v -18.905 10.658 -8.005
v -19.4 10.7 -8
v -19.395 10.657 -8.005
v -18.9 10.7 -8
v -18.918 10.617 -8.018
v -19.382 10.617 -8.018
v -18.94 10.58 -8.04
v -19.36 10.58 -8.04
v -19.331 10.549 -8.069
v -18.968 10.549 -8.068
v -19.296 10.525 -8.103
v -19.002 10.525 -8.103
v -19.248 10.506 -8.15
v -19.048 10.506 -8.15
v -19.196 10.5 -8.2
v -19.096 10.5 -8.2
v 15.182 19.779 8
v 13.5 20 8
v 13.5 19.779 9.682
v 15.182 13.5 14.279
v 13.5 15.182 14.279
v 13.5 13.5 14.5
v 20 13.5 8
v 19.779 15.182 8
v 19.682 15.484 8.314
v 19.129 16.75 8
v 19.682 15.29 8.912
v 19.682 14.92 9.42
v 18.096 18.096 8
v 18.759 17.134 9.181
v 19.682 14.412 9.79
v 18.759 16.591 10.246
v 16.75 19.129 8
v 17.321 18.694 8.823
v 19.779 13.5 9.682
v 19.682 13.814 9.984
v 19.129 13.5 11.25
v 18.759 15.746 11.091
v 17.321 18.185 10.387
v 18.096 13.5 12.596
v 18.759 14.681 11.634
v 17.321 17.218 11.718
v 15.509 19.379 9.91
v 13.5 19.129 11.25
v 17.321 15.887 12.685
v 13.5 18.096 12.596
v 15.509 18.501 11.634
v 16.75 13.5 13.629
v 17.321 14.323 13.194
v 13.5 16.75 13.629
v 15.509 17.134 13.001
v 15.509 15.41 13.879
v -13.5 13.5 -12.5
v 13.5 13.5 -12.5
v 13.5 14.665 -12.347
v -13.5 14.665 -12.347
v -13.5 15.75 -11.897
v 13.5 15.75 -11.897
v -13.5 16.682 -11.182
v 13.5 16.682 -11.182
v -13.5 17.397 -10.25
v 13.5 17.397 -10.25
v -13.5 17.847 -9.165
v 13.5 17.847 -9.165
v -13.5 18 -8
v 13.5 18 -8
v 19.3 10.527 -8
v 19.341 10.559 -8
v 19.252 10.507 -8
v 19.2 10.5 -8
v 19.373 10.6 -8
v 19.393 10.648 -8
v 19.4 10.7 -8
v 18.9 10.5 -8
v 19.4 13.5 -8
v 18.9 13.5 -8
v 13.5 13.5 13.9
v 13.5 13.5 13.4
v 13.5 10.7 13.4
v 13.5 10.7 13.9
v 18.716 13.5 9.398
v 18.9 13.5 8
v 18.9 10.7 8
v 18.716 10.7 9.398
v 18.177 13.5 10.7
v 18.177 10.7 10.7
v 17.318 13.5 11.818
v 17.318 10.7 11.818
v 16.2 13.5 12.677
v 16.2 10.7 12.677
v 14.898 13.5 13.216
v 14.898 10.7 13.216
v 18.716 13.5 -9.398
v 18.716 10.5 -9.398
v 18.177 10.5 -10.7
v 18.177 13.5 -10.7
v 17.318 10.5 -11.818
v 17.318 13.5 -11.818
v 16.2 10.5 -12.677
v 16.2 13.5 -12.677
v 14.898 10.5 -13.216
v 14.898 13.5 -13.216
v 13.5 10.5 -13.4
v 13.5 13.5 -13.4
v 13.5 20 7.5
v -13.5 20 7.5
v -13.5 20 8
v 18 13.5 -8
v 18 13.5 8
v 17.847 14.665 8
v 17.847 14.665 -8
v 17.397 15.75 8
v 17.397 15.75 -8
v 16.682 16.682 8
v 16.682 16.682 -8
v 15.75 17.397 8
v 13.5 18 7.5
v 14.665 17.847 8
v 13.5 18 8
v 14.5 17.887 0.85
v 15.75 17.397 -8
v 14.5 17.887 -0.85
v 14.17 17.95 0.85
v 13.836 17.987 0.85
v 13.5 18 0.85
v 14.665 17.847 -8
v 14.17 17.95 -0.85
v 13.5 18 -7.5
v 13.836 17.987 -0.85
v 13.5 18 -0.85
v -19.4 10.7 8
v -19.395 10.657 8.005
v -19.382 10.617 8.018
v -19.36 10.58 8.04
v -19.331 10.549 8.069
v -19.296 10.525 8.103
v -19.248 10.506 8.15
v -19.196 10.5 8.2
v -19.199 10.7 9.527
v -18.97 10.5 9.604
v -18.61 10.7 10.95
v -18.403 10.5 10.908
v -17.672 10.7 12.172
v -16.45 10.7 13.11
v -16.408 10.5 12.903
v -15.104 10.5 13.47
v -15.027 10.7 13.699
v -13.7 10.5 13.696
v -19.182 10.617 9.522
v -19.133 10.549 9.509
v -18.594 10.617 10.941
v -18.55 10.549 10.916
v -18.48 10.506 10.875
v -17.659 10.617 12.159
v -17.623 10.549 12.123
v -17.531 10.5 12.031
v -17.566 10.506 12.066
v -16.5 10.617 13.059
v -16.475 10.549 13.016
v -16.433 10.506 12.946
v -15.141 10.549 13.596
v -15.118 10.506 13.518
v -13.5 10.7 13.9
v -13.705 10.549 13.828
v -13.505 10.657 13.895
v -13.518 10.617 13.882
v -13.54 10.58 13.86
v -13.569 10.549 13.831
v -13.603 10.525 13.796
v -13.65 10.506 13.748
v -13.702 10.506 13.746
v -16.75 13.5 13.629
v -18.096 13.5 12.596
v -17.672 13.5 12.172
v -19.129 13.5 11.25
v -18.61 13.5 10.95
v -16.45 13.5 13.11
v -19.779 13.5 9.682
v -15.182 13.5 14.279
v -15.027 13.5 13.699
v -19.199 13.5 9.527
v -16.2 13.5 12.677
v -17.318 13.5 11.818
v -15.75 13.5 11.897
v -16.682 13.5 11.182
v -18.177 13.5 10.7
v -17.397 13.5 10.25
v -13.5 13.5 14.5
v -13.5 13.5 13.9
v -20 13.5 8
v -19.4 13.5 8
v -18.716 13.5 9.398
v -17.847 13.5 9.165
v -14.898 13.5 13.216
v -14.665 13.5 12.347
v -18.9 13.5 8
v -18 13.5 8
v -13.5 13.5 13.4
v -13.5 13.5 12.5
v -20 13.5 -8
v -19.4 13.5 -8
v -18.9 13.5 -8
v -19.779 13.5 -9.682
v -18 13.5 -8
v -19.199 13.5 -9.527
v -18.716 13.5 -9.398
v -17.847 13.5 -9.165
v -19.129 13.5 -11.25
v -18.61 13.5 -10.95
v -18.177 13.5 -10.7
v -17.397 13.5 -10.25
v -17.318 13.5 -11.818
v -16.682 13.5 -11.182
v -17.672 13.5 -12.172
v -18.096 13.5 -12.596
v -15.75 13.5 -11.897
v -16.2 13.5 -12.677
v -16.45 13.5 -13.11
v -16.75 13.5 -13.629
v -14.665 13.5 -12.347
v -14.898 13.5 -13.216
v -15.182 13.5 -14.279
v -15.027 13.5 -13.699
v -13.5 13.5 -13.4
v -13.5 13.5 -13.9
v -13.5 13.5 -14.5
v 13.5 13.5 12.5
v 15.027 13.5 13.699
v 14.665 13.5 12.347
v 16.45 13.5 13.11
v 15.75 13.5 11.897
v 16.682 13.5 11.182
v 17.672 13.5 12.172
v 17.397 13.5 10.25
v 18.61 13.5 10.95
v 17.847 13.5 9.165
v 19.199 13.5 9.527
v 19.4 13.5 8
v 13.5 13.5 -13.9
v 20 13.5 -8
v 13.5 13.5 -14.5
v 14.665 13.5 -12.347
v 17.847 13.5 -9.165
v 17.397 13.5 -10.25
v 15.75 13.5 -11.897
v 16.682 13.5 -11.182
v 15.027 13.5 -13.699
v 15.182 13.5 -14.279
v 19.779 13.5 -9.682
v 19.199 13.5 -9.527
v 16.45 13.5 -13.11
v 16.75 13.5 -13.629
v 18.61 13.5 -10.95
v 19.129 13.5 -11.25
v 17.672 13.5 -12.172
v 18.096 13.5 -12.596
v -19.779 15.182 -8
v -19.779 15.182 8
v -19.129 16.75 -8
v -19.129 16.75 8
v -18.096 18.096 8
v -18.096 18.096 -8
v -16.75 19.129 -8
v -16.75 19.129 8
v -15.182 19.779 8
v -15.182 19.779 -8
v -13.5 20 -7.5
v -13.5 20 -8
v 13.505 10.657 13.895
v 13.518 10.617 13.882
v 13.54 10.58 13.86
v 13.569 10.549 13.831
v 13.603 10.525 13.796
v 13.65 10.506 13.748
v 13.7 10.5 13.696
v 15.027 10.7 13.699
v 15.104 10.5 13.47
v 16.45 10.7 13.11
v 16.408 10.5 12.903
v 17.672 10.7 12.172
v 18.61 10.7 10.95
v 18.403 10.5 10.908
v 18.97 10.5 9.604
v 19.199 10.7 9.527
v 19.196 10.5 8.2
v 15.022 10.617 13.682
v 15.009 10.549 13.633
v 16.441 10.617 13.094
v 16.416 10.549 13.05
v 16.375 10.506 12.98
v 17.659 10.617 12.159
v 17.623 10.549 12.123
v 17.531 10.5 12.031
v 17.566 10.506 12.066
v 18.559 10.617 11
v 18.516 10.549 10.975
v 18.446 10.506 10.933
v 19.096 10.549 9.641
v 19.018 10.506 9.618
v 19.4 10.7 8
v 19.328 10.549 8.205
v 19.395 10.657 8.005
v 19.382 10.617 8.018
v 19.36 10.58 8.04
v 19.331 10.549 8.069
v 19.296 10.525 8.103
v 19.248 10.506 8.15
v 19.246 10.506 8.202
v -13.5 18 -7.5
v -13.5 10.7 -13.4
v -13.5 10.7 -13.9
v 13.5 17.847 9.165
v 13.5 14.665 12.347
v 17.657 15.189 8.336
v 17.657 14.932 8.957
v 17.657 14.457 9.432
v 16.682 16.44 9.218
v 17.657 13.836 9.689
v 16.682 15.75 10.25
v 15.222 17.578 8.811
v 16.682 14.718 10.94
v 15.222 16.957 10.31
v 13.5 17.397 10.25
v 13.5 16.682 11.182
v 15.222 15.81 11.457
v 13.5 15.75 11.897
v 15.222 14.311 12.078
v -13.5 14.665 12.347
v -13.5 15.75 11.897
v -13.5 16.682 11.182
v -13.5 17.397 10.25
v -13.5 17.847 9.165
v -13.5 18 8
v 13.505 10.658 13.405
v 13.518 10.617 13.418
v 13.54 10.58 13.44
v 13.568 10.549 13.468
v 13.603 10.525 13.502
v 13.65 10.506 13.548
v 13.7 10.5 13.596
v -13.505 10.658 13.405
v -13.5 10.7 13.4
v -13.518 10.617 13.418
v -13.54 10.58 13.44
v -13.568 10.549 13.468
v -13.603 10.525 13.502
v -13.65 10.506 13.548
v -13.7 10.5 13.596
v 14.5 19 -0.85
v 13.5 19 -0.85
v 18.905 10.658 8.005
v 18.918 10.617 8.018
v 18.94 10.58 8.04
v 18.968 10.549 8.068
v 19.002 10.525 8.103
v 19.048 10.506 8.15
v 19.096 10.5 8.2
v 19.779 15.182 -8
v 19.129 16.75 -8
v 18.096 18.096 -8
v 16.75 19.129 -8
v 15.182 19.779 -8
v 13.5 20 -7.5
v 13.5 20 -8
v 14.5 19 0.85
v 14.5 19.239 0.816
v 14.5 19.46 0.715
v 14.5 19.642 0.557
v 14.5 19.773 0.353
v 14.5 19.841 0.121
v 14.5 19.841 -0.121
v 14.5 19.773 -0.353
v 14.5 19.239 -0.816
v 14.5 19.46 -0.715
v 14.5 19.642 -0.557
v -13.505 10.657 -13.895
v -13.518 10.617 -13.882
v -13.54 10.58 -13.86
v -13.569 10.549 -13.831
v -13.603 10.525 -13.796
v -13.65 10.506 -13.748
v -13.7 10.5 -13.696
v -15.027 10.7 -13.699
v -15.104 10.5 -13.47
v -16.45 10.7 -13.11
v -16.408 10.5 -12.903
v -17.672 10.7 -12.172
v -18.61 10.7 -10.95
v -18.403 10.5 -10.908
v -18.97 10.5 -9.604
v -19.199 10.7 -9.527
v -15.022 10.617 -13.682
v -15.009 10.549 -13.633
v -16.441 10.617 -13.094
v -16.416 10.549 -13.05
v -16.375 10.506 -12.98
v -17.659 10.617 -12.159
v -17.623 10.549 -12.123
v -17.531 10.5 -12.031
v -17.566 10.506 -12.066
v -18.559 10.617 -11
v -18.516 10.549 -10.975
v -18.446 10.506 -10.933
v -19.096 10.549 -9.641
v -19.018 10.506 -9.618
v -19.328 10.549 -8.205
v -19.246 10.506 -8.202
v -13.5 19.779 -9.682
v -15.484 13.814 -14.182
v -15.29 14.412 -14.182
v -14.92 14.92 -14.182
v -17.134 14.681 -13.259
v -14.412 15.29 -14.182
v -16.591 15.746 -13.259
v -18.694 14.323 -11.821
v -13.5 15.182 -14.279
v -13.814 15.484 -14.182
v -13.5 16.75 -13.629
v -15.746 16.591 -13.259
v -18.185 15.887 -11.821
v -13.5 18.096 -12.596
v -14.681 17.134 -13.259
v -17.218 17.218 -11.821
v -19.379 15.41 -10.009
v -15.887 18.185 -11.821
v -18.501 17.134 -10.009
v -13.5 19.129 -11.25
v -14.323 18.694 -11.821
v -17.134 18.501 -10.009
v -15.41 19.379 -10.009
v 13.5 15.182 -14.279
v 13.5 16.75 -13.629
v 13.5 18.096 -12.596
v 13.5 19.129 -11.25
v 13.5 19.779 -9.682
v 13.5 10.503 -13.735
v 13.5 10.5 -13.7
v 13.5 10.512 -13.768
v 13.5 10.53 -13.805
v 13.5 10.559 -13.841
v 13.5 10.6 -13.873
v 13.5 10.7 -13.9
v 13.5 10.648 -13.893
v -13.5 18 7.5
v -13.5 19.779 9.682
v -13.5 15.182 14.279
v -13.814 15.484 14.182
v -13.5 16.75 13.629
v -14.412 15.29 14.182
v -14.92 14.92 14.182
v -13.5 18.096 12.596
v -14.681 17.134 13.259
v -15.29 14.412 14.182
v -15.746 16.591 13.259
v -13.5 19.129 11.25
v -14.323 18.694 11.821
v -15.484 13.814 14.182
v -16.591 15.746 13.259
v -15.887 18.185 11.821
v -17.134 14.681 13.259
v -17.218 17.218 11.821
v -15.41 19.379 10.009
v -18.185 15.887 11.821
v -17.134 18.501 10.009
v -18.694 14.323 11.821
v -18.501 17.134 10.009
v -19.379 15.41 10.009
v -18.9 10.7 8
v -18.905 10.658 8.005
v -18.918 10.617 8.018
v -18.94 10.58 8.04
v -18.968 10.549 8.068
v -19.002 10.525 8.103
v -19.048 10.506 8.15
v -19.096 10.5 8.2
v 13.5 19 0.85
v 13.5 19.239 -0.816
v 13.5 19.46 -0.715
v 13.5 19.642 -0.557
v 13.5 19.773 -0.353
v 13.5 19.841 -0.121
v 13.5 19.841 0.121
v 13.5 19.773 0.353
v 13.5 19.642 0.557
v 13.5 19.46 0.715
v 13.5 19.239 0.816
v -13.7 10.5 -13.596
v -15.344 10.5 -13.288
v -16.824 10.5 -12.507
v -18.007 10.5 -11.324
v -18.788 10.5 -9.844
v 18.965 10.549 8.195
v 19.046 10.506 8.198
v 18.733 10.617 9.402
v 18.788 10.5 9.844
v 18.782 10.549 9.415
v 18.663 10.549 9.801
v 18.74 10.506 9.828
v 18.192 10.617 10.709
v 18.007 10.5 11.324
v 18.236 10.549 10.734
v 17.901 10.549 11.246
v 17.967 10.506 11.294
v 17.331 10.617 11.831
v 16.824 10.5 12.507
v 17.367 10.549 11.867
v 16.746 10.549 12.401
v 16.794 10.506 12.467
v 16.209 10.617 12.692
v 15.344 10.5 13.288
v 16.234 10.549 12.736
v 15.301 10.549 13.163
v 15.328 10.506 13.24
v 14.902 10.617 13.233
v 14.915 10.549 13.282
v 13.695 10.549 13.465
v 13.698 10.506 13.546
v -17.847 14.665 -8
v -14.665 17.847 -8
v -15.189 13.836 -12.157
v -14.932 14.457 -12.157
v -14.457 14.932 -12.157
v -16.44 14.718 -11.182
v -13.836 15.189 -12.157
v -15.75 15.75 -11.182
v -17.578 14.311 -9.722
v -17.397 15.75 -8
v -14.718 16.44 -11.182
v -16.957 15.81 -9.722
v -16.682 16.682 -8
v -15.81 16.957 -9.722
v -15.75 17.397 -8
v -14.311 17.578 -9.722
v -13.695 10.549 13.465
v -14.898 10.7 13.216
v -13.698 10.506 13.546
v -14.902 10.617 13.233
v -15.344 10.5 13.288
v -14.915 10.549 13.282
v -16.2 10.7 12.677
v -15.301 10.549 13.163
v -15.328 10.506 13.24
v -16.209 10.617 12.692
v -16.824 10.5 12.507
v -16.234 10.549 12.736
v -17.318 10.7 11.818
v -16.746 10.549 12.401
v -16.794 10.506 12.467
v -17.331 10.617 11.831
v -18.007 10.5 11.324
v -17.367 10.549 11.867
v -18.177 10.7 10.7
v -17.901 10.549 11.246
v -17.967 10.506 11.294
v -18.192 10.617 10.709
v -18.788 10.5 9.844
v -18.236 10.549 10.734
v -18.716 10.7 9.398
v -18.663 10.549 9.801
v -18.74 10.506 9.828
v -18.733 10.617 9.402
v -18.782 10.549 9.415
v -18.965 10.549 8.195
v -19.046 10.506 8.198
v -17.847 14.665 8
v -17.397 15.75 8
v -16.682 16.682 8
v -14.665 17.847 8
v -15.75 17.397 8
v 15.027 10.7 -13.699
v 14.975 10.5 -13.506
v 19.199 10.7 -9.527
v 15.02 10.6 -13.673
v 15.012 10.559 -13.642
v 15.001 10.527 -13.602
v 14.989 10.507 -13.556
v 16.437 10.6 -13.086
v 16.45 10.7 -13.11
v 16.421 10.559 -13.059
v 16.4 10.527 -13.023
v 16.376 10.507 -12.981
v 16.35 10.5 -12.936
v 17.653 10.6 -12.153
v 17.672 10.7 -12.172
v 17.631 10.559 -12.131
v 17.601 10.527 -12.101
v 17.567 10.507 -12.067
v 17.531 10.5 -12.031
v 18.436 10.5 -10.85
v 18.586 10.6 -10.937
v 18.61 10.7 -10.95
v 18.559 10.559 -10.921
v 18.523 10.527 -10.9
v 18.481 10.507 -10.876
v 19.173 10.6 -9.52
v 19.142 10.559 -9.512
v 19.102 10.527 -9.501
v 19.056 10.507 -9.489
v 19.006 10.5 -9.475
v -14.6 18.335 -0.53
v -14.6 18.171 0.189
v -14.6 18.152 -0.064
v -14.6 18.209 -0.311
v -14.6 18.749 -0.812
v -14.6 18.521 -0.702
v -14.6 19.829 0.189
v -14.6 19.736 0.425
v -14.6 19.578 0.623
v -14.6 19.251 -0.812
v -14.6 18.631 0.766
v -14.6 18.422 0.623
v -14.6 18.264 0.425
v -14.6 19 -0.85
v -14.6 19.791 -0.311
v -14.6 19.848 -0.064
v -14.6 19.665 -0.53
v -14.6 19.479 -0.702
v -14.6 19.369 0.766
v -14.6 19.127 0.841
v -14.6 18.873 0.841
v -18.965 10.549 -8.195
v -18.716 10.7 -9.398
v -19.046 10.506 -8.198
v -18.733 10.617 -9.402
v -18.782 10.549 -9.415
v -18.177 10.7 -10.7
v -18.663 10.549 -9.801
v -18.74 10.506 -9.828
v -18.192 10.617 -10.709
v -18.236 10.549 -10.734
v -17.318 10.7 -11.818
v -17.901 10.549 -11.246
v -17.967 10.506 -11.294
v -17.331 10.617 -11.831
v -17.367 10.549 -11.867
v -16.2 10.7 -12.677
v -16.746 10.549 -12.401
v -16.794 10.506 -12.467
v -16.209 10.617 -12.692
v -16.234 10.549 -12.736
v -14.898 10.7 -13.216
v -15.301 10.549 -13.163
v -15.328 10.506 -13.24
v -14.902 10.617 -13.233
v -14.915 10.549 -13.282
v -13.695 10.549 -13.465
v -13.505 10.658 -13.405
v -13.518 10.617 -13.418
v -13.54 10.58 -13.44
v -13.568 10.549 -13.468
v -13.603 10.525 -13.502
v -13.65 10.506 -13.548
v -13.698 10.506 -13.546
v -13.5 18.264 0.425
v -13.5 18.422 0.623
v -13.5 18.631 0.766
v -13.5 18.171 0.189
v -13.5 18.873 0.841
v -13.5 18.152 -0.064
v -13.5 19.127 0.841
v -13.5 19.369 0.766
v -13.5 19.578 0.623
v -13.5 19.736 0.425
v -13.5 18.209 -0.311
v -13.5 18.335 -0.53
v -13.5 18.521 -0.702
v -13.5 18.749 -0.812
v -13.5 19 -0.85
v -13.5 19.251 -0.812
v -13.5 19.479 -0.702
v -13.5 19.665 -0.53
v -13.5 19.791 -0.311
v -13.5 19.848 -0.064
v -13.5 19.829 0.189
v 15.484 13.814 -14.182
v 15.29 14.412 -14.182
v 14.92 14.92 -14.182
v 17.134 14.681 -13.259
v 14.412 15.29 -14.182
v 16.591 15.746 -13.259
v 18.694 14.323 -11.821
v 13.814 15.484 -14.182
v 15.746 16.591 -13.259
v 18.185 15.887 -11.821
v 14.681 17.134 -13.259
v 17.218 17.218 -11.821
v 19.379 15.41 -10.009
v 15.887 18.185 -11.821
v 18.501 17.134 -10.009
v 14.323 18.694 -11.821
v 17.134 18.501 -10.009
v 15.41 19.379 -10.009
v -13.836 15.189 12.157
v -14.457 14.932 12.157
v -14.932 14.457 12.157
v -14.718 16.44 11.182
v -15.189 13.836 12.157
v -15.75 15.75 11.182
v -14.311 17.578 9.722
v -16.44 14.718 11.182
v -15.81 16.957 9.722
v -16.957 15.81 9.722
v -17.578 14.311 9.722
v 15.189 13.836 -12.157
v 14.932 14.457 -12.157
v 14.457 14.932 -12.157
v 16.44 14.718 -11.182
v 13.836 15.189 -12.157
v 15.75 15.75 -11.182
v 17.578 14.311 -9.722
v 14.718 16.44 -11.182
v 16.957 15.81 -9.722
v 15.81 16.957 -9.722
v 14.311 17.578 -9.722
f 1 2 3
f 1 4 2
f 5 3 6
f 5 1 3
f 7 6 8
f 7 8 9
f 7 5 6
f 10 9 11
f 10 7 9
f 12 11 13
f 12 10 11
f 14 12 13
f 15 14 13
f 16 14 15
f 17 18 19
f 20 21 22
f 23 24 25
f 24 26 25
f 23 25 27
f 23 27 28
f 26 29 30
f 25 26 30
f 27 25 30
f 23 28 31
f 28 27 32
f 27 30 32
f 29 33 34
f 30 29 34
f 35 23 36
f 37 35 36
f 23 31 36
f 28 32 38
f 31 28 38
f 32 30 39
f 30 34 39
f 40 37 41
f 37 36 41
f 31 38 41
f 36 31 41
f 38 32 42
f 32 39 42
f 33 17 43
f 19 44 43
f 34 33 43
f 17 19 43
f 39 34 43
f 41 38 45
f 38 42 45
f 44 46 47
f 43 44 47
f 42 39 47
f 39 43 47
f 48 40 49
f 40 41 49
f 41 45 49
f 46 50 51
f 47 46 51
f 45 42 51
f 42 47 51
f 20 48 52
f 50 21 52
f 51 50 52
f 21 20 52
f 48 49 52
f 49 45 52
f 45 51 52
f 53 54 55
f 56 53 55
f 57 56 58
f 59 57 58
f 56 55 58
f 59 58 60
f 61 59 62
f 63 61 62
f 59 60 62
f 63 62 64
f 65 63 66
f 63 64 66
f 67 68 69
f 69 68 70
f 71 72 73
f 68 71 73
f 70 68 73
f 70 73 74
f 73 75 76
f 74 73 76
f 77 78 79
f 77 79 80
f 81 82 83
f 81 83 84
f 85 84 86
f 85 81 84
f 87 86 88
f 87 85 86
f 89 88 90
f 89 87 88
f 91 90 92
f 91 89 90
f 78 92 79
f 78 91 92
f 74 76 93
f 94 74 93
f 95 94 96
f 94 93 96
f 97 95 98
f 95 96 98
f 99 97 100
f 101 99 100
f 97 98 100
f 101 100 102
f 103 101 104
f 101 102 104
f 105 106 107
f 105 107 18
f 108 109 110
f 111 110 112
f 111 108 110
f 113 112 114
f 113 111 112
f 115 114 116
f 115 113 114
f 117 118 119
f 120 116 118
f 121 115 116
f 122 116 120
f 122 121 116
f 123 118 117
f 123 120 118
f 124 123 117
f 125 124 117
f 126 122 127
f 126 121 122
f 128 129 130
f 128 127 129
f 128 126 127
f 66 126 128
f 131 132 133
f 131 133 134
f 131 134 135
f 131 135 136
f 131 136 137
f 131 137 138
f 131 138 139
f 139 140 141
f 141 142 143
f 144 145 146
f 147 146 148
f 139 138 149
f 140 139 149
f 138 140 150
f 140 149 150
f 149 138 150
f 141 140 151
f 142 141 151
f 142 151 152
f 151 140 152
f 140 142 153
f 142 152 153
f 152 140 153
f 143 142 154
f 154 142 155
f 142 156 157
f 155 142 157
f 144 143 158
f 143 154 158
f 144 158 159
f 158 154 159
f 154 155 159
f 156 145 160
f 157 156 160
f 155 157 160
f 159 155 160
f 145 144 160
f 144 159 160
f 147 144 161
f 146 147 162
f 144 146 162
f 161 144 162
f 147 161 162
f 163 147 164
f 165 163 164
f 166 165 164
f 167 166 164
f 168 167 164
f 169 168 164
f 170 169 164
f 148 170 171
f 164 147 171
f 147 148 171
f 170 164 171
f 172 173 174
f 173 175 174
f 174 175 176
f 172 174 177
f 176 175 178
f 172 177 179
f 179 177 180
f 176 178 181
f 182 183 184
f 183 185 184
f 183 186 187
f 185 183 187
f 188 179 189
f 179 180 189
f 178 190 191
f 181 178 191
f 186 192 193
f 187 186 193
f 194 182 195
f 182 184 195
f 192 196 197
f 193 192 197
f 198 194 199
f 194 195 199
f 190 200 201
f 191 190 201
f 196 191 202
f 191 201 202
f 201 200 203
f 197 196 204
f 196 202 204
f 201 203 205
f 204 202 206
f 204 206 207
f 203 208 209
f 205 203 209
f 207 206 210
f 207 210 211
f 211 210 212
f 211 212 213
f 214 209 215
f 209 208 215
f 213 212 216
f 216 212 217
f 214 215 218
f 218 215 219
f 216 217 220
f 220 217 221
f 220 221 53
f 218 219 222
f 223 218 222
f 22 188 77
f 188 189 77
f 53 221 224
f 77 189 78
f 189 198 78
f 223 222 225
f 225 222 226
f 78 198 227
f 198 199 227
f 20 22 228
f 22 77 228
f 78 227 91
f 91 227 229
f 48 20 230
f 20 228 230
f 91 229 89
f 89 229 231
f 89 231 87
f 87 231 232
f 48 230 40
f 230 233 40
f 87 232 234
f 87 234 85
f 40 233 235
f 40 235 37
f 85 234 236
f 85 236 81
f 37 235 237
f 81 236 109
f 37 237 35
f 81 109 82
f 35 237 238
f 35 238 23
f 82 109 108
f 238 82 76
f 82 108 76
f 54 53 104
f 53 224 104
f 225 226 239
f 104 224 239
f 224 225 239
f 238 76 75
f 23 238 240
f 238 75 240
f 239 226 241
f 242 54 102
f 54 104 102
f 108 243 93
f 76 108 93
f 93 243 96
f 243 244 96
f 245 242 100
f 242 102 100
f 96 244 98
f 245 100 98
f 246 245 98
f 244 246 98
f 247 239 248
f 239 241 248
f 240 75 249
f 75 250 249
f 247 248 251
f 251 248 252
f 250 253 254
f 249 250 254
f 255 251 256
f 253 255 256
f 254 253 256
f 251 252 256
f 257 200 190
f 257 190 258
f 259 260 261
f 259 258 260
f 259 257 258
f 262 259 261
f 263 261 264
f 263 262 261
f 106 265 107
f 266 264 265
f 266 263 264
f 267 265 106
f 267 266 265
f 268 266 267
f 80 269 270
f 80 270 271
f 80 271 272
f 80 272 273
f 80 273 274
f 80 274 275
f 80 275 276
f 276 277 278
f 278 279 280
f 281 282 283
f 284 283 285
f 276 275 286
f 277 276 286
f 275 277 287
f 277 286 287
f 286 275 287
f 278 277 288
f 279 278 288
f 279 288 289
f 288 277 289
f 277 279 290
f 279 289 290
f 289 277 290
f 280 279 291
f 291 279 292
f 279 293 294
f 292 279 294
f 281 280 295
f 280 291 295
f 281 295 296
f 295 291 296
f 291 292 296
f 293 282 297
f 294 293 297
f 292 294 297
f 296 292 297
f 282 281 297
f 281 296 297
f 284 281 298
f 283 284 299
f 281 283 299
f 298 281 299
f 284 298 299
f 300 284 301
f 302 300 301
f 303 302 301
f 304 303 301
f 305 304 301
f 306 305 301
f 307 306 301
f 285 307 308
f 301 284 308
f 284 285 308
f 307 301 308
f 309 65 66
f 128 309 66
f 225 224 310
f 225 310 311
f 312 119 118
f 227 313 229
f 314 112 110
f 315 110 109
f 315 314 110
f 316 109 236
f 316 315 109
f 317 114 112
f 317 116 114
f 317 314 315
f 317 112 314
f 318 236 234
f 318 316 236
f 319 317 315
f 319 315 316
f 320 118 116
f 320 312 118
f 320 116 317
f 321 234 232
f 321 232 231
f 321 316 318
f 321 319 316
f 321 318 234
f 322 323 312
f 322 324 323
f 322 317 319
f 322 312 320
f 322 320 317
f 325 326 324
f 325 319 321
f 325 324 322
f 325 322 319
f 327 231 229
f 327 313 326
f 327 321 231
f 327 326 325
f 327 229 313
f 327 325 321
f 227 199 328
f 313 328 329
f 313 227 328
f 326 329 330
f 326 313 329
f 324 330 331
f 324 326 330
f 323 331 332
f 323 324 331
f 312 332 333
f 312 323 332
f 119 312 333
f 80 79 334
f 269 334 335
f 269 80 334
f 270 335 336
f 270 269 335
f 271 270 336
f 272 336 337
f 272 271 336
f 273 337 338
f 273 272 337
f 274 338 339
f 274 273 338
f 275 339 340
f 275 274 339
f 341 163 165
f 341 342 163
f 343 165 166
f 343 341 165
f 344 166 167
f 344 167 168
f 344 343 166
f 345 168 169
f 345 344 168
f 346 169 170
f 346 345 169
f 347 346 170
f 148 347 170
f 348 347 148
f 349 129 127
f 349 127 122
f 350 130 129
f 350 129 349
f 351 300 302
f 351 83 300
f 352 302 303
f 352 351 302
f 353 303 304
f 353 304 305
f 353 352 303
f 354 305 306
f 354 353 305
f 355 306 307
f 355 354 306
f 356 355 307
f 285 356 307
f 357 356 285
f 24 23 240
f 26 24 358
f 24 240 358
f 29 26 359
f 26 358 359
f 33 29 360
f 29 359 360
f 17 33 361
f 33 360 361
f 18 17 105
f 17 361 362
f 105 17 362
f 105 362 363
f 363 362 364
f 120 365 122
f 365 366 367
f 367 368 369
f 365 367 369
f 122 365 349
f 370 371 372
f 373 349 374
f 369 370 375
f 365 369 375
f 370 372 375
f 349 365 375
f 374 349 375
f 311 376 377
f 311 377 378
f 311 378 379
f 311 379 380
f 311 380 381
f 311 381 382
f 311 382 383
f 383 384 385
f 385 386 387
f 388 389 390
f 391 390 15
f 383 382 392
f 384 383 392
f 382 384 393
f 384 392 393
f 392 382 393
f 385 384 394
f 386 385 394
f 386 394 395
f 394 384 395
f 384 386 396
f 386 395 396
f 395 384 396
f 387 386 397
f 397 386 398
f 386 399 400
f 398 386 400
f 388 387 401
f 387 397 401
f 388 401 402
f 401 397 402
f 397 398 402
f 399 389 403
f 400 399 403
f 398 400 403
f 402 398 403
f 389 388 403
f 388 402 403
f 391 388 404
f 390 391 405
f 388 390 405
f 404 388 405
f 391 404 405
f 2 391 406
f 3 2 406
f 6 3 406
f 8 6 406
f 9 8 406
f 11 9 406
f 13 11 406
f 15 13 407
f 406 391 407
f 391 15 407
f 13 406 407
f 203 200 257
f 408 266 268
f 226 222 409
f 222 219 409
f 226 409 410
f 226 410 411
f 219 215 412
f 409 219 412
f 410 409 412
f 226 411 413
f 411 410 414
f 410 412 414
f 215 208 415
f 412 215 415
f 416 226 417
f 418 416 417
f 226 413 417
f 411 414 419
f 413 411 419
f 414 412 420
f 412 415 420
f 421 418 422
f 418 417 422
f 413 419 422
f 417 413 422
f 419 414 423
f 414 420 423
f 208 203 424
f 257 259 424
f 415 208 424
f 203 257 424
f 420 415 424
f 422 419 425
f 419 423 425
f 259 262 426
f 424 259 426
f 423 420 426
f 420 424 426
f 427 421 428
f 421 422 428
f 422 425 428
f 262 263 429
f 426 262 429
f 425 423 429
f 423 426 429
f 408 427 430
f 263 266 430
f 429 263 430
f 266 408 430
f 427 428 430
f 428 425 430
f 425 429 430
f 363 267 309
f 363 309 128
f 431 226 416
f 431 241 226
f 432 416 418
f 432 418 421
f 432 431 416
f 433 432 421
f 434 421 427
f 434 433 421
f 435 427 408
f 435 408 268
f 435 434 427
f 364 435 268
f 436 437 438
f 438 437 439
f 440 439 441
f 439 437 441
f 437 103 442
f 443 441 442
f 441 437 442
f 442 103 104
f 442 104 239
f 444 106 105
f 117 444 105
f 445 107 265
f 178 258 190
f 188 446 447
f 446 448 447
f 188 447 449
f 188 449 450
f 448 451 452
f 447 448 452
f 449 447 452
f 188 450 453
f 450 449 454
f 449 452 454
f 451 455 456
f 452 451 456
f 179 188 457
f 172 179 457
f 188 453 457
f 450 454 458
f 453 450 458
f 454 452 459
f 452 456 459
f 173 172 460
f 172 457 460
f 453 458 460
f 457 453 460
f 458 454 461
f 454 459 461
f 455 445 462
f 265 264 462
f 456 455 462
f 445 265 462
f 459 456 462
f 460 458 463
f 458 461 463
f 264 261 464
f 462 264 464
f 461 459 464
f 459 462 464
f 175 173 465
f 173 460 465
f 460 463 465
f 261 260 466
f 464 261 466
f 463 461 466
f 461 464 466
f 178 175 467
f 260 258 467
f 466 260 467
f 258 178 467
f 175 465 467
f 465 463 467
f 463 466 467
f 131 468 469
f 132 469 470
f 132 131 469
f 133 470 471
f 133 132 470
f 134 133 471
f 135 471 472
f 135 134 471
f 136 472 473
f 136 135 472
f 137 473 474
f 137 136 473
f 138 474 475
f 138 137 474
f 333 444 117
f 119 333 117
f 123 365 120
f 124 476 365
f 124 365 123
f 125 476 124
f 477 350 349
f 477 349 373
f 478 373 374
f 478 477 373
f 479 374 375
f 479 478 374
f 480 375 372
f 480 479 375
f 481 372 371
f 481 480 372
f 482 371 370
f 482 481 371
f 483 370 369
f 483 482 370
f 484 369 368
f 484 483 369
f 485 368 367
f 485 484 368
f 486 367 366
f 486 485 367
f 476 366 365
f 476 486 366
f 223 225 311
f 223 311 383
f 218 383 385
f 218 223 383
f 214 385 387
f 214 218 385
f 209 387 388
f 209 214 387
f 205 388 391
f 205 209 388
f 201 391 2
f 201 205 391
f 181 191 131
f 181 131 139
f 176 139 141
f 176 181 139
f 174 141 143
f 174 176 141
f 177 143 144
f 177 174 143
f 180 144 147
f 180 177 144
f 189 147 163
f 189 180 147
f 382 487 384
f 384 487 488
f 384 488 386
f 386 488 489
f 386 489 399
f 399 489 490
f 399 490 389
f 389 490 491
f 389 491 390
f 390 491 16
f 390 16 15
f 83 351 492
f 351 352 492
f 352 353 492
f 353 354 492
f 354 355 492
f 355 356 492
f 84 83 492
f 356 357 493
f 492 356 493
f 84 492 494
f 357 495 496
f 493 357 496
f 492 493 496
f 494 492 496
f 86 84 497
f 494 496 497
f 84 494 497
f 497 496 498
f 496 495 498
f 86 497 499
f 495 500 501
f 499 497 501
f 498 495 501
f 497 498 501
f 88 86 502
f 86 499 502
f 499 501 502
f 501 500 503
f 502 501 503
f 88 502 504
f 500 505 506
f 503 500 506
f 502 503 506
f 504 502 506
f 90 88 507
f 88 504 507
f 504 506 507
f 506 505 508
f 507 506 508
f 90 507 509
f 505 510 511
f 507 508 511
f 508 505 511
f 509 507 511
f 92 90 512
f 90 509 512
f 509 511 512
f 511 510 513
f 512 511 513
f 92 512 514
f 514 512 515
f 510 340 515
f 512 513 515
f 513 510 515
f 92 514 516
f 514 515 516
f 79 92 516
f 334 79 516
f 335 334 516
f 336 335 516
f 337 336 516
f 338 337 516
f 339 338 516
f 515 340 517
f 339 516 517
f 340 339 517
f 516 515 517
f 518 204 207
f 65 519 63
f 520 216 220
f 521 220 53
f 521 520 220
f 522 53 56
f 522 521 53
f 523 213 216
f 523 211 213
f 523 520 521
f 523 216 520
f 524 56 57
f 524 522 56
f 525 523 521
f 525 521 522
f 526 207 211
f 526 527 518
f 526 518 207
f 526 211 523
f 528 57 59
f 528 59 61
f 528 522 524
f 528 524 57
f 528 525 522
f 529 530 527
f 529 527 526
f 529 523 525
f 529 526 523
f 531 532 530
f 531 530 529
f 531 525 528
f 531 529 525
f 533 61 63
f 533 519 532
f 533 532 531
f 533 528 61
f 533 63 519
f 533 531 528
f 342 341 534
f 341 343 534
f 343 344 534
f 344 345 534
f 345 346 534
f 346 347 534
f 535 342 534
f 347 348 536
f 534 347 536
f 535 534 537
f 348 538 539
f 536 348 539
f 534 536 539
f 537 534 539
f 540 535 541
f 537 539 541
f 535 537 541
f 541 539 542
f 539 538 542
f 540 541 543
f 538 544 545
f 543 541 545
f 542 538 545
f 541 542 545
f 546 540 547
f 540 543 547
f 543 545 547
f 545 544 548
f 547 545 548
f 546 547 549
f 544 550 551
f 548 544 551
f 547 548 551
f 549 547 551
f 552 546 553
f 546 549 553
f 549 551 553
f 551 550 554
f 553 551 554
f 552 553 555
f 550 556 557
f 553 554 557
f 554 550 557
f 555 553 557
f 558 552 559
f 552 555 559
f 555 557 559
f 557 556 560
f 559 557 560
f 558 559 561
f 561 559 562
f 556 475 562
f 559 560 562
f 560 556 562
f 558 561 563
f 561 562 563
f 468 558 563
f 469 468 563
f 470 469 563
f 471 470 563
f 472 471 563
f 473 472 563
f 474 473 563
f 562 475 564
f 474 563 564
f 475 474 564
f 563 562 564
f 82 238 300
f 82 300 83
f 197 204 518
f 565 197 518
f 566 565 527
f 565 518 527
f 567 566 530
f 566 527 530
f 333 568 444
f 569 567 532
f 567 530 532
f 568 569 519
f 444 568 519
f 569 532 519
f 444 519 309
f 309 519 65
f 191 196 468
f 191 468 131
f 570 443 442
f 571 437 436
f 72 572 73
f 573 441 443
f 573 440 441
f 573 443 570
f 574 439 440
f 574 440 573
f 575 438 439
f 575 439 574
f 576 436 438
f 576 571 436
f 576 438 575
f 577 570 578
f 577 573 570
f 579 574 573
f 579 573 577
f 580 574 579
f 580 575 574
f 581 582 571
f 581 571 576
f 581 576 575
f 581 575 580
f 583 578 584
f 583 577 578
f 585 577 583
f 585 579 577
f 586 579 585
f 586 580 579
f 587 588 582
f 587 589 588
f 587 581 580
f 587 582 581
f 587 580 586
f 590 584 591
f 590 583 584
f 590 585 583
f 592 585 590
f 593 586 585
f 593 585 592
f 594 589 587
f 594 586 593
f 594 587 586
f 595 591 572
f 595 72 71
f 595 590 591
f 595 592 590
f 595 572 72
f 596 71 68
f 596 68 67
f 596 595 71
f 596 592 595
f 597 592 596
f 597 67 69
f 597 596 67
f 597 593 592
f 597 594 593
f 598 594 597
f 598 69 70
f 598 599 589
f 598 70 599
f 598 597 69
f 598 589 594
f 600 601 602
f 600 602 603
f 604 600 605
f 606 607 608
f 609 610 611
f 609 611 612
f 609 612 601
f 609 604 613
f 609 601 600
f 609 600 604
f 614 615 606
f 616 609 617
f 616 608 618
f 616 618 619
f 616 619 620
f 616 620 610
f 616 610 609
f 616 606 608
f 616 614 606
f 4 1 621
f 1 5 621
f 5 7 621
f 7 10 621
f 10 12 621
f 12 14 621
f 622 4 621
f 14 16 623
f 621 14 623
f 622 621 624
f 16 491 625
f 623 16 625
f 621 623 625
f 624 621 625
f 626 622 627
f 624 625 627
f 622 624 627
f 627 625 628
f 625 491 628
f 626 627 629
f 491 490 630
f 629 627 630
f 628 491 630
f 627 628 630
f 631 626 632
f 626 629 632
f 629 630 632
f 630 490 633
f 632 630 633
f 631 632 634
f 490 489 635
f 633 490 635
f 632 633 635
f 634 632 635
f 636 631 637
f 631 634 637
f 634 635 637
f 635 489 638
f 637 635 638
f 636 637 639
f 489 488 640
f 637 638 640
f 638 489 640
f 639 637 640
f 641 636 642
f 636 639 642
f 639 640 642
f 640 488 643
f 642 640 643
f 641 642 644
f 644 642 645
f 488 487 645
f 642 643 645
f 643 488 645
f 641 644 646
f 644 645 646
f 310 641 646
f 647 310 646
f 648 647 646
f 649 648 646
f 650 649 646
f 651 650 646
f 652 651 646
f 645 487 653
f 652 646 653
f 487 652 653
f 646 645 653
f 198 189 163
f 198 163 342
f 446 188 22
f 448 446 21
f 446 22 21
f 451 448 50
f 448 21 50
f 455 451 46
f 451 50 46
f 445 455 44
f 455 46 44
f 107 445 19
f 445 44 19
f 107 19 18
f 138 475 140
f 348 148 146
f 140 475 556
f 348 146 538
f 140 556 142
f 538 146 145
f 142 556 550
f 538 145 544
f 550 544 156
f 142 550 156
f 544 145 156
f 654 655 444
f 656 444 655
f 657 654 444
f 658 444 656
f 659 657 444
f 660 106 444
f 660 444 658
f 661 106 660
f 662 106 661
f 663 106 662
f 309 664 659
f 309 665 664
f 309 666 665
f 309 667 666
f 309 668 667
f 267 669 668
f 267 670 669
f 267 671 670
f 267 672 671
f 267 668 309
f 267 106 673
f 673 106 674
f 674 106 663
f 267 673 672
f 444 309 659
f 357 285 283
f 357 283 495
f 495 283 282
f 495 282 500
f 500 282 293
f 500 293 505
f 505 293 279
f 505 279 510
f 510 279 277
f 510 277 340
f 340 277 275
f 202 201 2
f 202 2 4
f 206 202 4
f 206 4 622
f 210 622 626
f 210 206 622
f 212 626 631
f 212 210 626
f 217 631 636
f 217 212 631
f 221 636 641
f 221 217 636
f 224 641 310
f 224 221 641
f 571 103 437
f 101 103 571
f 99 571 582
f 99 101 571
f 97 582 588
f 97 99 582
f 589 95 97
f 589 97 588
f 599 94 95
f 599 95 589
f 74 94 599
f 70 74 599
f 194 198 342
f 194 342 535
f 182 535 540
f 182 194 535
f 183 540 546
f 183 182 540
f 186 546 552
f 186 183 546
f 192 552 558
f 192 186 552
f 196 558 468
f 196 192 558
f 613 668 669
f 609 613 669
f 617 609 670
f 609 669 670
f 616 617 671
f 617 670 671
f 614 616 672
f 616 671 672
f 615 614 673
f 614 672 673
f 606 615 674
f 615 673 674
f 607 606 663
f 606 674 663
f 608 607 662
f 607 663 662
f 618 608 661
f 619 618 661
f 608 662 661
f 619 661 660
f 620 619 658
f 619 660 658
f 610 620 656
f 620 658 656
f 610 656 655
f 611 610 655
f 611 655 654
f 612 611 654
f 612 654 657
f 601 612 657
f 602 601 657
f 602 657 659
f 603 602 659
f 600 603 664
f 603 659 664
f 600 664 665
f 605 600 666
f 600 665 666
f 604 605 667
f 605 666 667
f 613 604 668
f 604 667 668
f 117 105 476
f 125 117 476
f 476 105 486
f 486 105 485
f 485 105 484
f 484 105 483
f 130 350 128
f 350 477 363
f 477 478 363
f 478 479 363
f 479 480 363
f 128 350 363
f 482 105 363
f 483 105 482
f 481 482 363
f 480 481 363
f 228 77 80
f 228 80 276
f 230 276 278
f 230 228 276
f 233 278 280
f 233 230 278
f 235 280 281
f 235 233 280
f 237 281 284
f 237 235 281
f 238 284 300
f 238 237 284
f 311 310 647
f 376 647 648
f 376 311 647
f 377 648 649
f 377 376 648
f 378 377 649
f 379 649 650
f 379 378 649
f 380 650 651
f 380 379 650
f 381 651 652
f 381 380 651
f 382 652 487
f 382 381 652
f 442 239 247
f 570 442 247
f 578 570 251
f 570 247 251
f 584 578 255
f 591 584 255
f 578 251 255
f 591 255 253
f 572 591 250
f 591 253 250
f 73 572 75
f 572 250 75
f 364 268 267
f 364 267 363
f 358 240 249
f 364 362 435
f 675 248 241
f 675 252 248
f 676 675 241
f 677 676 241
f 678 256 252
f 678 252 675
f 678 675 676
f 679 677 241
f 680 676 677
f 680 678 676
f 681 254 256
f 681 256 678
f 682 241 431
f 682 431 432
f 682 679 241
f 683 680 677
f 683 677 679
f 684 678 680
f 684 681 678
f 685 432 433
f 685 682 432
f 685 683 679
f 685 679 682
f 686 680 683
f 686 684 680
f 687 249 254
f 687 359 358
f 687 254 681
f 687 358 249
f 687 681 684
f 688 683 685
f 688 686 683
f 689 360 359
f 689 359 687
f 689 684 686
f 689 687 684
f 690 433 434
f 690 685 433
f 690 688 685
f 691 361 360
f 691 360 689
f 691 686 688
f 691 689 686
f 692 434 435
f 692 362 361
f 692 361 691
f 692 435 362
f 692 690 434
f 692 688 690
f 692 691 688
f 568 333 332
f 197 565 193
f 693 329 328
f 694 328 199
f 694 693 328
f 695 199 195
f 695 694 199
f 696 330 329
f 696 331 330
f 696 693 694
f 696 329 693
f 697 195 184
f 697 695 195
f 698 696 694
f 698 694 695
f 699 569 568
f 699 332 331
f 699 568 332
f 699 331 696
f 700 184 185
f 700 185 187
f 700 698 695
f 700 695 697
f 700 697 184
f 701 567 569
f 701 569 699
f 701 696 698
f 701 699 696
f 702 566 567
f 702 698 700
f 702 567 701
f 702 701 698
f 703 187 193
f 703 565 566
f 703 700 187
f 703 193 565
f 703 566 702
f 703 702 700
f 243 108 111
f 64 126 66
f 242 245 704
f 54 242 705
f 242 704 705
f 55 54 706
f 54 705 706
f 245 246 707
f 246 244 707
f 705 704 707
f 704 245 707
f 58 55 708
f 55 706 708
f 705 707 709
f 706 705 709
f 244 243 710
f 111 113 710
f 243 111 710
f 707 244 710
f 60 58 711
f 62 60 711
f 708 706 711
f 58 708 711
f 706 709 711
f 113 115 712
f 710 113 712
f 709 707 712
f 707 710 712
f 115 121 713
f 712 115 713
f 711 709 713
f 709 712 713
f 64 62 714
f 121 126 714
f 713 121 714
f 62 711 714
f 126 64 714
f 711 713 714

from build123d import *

# Parameters (mm, degrees)
SKETCH1_W           = 40
SKETCH1_H           = 29
BOSS_EXTRUDE1_DEPTH = 20
FILLET2_R           = 6.5
SKETCH3_W           = 48.982601016
SKETCH3_H           = 39.309165856
CUT_EXTRUDE1_DEPTH  = 14.5
SHELL1_T            = -2
BOSS_EXTRUDE3_DEPTH = 3
FILLET3_R           = 0.2
SKETCH6_W           = 27
SKETCH6_H           = 15
CUT_EXTRUDE2_DEPTH  = 10.5000001
SKETCH7_R           = 0.85
CUT_EXTRUDE3_DEPTH  = 1.1
CUT_EXTRUDE4_DEPTH  = 1


with BuildPart() as part:
    # Sketch1 → Boss-Extrude1 (new body)
    with BuildSketch(Plane(origin=(0, 0, 0), x_dir=(1, 0, 0), z_dir=(0, 1, 0))):
        Rectangle(SKETCH1_W, SKETCH1_H)
    extrude(amount=BOSS_EXTRUDE1_DEPTH)

    # Fillet2
    fillet2_edges = [part.edges().sort_by_distance(p)[0] for p in [
        (-20, 20, 0),
        (0, 20, 14.5),
        (20, 20, 0),
        (0, 0, 14.5),
        (-20, 0, 0),
        (0, 0, -14.5),
        (20, 0, 0),
        (20, 10, 14.5),
        (-20, 10, 14.5),
        (-20, 10, -14.5),
        (20, 10, -14.5),
        (0, 20, -14.5),
    ]]
    fillet(fillet2_edges, radius=FILLET2_R)

    # Sketch3 → Cut-Extrude1 (cut, through all)
    with BuildSketch(Plane(origin=(0, 13.5, 0), x_dir=(1, 0, 0), z_dir=(0, 1, 0))):
        Rectangle(SKETCH3_W, SKETCH3_H)
    extrude(amount=-CUT_EXTRUDE1_DEPTH, mode=Mode.SUBTRACT)

    # Shell1
    shell1_openings = [part.faces().sort_by_distance(p)[0] for p in [
        (0, 13.5, 0),
    ]]
    offset(amount=SHELL1_T, openings=shell1_openings)

    # Sketch5 → Boss-Extrude3 (add)
    with BuildSketch(Plane.XZ.offset(-13.5)):
        with BuildLine():
            Line((-13.5, 13.9), (-13.5, 13.4))
            ThreePointArc((-13.5, 13.4), (-17.318376618, 11.818376618), (-18.9, 8))
            Line((-18.9, 8), (-19.4, 8))
            ThreePointArc((-19.4, 8), (-17.671930009, 12.171930009), (-13.5, 13.9))
        make_face()
        with BuildLine():
            Line((-19.4, -8), (-18.9, -8))
            ThreePointArc((-18.9, -8), (-17.318376618, -11.818376618), (-13.5, -13.4))
            Line((-13.5, -13.4), (-13.5, -13.9))
            ThreePointArc((-13.5, -13.9), (-17.671930009, -12.171930009), (-19.4, -8))
        make_face()
        with BuildLine():
            Line((13.5, -13.4), (13.5, -13.9))
            ThreePointArc((13.5, -13.9), (17.671930009, -12.171930009), (19.4, -8))
            Line((19.4, -8), (18.9, -8))
            ThreePointArc((18.9, -8), (17.318376618, -11.818376618), (13.5, -13.4))
        make_face()
        with BuildLine():
            Line((19.4, 8), (18.9, 8))
            ThreePointArc((18.9, 8), (17.318376618, 11.818376618), (13.5, 13.4))
            Line((13.5, 13.4), (13.5, 13.9))
            ThreePointArc((13.5, 13.9), (17.671930009, 12.171930009), (19.4, 8))
        make_face()
    extrude(amount=BOSS_EXTRUDE3_DEPTH)

    # Fillet3
    fillet3_edges = [part.edges().sort_by_distance(p)[0] for p in [
        (-17.318376618, 10.5, 11.818376618),
        (-17.671930009, 10.5, 12.171930009),
        (-17.318376618, 10.5, -11.818376618),
        (-17.671930009, 10.5, -12.171930009),
        (17.318376618, 10.5, 11.818376618),
        (17.671930009, 10.5, 12.171930009),
        (17.671930009, 10.5, -12.171930009),
        (-19.15, 10.5, 8),
        (-13.5, 10.5, 13.65),
        (-13.5, 10.5, -13.65),
        (-19.15, 10.5, -8),
        (13.5, 10.5, 13.65),
        (19.15, 10.5, 8),
    ]]
    fillet(fillet3_edges, radius=FILLET3_R)

    # Sketch6 → Cut-Extrude2 (cut, through all)
    with BuildSketch(Plane(origin=(0, 20, 0), x_dir=(1, 0, 0), z_dir=(0, 1, 0))):
        Rectangle(SKETCH6_W, SKETCH6_H)
    extrude(amount=-CUT_EXTRUDE2_DEPTH, mode=Mode.SUBTRACT)

    # Sketch7 → Cut-Extrude3 (cut)
    with BuildSketch(Plane(origin=(-13.5, 0, 0), x_dir=(0, 0, -1), z_dir=(1, 0, 0))):
        with Locations((0, 19)):
            Circle(SKETCH7_R)
    extrude(amount=-CUT_EXTRUDE3_DEPTH, mode=Mode.SUBTRACT)

    # Sketch9 → Cut-Extrude4 (cut)
    with BuildSketch(Plane.ZY.offset(-13.5)):
        with BuildLine():
            Line((0.85, 19), (0.85, 18))
            Line((0.85, 18), (0.85, 17.368151277))
            Line((0.85, 17.368151277), (-0.85, 17.368151277))
            Line((-0.85, 17.368151277), (-0.85, 18))
            Line((-0.85, 18), (-0.85, 19))
            ThreePointArc((-0.85, 19), (0, 19.85), (0.85, 19))
        make_face()
    extrude(amount=-CUT_EXTRUDE4_DEPTH, mode=Mode.SUBTRACT)


solid = part.part
